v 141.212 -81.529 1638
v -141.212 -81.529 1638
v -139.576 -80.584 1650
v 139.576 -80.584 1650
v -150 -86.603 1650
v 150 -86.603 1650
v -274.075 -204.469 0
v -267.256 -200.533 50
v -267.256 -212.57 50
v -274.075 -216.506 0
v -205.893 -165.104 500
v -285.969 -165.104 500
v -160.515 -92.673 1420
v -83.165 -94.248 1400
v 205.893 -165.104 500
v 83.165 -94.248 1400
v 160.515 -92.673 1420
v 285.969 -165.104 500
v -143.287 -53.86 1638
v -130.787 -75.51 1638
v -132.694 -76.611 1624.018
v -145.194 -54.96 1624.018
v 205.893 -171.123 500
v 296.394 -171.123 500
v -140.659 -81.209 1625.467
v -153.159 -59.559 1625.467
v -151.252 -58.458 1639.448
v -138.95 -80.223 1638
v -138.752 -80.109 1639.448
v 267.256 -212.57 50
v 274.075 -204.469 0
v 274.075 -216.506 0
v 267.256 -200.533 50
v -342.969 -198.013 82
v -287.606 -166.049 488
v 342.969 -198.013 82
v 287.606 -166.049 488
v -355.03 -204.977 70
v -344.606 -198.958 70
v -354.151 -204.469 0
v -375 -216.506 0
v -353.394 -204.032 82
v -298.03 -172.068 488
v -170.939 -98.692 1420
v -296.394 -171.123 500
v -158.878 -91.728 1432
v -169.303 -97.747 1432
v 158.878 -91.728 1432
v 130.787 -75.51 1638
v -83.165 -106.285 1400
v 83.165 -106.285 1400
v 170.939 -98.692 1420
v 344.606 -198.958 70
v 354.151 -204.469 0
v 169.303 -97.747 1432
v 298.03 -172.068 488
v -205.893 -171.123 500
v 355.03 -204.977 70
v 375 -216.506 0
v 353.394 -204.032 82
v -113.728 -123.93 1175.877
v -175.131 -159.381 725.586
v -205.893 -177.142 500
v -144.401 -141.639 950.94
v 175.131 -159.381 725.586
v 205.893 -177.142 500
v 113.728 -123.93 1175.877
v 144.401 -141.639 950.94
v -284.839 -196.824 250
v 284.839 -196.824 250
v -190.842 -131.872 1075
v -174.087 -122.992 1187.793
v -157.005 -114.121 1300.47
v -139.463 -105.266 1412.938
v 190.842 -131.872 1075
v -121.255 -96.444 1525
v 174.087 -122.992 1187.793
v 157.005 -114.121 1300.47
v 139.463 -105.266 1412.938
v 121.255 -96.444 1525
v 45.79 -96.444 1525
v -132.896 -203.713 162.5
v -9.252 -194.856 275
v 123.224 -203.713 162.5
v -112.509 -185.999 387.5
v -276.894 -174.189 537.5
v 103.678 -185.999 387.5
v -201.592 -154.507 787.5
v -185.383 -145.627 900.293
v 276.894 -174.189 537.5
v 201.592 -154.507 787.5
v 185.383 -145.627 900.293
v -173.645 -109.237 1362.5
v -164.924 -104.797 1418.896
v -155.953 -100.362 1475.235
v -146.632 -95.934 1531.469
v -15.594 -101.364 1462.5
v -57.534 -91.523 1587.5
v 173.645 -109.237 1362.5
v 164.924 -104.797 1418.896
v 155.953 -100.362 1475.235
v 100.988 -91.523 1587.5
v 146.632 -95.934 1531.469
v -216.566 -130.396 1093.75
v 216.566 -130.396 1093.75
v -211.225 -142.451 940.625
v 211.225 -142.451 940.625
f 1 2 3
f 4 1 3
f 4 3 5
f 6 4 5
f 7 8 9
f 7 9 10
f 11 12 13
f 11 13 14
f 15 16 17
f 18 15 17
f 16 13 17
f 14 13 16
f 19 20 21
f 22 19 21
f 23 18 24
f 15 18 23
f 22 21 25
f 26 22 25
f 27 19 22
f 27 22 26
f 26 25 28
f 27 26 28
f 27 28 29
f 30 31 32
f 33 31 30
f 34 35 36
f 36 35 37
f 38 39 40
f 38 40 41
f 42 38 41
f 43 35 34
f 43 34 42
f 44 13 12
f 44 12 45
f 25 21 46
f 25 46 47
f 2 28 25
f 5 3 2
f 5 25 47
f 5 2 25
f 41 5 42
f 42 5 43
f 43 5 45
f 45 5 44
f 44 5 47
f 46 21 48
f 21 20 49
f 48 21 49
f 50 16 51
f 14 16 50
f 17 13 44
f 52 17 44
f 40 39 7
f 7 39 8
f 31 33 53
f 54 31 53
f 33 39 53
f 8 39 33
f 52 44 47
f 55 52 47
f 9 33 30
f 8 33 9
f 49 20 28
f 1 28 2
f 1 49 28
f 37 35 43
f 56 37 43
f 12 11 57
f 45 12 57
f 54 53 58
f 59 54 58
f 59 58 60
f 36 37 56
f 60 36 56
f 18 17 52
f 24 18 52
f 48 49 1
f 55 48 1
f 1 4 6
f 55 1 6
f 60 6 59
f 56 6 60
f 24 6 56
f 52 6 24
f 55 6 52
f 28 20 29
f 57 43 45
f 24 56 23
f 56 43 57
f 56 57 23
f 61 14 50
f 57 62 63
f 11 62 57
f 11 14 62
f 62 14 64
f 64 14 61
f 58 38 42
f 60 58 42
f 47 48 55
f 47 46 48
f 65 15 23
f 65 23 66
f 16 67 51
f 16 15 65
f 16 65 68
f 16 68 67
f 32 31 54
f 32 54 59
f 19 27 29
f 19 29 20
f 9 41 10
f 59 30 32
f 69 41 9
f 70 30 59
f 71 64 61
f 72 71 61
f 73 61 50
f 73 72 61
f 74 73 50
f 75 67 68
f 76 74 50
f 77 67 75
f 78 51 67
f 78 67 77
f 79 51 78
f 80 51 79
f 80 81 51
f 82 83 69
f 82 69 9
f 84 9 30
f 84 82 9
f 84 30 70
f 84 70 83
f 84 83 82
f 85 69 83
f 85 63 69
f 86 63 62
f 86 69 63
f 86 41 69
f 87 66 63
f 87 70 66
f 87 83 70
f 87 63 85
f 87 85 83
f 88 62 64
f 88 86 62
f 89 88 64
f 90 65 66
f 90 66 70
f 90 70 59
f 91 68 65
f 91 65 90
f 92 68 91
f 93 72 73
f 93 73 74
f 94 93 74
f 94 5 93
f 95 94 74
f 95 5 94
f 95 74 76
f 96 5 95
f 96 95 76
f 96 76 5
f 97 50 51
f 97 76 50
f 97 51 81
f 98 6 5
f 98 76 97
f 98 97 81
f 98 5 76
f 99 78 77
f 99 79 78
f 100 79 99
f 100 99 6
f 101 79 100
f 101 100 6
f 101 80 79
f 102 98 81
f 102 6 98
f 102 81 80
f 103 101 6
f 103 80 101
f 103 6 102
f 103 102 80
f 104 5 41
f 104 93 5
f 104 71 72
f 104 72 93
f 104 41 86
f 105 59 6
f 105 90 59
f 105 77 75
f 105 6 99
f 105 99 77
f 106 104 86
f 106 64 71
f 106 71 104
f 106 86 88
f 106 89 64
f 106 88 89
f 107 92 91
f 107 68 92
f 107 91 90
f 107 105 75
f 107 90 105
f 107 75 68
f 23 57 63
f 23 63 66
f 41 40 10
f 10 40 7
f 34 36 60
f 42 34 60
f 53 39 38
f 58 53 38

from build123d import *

# Parameters (mm, degrees)
F7_R      = 960.2431856589
F8_DEPTH  = 635.5163904251
F12_R     = 870.2287794889
F13_DEPTH = 25
F14_R     = 892.9375722879
F15_DEPTH = 25
F19_REACH = 935.9843056137
F20_DEPTH = 216.5073510461
F23_DEPTH = 25


with BuildPart() as f5:
    # F3 (on Top) → F5 section 0
    with BuildSketch(Plane.XY):
        Polygon((-375, -216.5063509461), (375, -216.5063509461), (0, 433.0127018922), align=None)
    # F4 (on line) → F5 section 1
    with BuildSketch(Plane.XY.offset(1650)):
        Polygon((-150, -86.6025403784), (150, -86.6025403784), (0, 173.2050807569), align=None)
    loft()

    # F7 (on face) → F8 (cut, through all)
    with BuildSketch(Plane(origin=(0, -203.2096543416, 15.9986111776), x_dir=(1, 0, 0), z_dir=(0, -0.9969151597, 0.078486714))):
        with Locations((0, 812.9688501358)):
            Circle(F7_R)
    extrude(amount=-F8_DEPTH, mode=Mode.SUBTRACT)

    # F12 (on face) → F13 (cut)
    with BuildSketch(Plane(origin=(0, 0, 0), x_dir=(0.8660254038, -0.5, 0), z_dir=(-0.5, -0.8660254038, 0))):
        with Locations((304.0688931942, 817.2121047974)):
            Circle(F12_R)
    extrude(amount=-F13_DEPTH, mode=Mode.SUBTRACT)

    # F14 (on face) → F15 (cut)
    with BuildSketch(Plane(origin=(0, 0, 0), x_dir=(-0.8660254038, -0.5, 0), z_dir=(-0.5, 0.8660254038, 0))):
        with Locations((291.6465699673, 811.1194968224)):
            Circle(F14_R)
    extrude(amount=F15_DEPTH, mode=Mode.SUBTRACT)

    f19_end = Plane(origin=(0, -155.5781982198, 697.4454188962), x_dir=(0, 0.078486714, 0.9969151597), z_dir=(0, 0.9969151597, -0.078486714))
    # F17 (on Front) → F19 (cut, up to a plane its end follows)
    with BuildSketch(Plane.XZ):
        Polygon((-181.3636363636, 1420), (181.3636363636, 1420), (179.7272727273, 1432), (-179.7272727273, 1432), align=None)
        Polygon((151.6363636364, 1638), (150, 1650), (-150, 1650), (-151.6363636364, 1638), align=None)
        Polygon((308.4545454545, 488), (306.8181818182, 500), (-306.8181818182, 500), (-308.4545454545, 488), align=None)
        Polygon((-365.4545454545, 70), (365.4545454545, 70), (363.8181818182, 82), (-363.8181818182, 82), align=None)
    f19_long = extrude(amount=F19_REACH, mode=Mode.PRIVATE)
    add(split(f19_long, bisect_by=f19_end, keep=Keep.TOP, mode=Mode.PRIVATE), mode=Mode.SUBTRACT)

    # F16 (on Front) → F20 (cut, through all)
    with BuildSketch(Plane.XZ):
        Polygon((-267.2563485856, 50), (-274.0745304038, 0), (274.0745304038, 0), (267.2563485856, 50), align=None)
        Polygon((-205.8927122219, 500), (205.8927122219, 500), (83.1654394947, 1400), (-83.1654394947, 1400), align=None)
    extrude(amount=F20_DEPTH, mode=Mode.SUBTRACT)

    # F22 (on face) → F23 (join)
    with BuildSketch(Plane(origin=(0, 0, 0), x_dir=(-0.8660254038, -0.5, 0), z_dir=(-0.5, 0.8660254038, 0))):
        Polygon((160.2172859615, 1639.4481457139), (151.0203254662, 1638), (153.2218541075, 1624.0184153092), (162.4188146029, 1625.4665610231), align=None)
    extrude(amount=F23_DEPTH)


solid = f5.part
